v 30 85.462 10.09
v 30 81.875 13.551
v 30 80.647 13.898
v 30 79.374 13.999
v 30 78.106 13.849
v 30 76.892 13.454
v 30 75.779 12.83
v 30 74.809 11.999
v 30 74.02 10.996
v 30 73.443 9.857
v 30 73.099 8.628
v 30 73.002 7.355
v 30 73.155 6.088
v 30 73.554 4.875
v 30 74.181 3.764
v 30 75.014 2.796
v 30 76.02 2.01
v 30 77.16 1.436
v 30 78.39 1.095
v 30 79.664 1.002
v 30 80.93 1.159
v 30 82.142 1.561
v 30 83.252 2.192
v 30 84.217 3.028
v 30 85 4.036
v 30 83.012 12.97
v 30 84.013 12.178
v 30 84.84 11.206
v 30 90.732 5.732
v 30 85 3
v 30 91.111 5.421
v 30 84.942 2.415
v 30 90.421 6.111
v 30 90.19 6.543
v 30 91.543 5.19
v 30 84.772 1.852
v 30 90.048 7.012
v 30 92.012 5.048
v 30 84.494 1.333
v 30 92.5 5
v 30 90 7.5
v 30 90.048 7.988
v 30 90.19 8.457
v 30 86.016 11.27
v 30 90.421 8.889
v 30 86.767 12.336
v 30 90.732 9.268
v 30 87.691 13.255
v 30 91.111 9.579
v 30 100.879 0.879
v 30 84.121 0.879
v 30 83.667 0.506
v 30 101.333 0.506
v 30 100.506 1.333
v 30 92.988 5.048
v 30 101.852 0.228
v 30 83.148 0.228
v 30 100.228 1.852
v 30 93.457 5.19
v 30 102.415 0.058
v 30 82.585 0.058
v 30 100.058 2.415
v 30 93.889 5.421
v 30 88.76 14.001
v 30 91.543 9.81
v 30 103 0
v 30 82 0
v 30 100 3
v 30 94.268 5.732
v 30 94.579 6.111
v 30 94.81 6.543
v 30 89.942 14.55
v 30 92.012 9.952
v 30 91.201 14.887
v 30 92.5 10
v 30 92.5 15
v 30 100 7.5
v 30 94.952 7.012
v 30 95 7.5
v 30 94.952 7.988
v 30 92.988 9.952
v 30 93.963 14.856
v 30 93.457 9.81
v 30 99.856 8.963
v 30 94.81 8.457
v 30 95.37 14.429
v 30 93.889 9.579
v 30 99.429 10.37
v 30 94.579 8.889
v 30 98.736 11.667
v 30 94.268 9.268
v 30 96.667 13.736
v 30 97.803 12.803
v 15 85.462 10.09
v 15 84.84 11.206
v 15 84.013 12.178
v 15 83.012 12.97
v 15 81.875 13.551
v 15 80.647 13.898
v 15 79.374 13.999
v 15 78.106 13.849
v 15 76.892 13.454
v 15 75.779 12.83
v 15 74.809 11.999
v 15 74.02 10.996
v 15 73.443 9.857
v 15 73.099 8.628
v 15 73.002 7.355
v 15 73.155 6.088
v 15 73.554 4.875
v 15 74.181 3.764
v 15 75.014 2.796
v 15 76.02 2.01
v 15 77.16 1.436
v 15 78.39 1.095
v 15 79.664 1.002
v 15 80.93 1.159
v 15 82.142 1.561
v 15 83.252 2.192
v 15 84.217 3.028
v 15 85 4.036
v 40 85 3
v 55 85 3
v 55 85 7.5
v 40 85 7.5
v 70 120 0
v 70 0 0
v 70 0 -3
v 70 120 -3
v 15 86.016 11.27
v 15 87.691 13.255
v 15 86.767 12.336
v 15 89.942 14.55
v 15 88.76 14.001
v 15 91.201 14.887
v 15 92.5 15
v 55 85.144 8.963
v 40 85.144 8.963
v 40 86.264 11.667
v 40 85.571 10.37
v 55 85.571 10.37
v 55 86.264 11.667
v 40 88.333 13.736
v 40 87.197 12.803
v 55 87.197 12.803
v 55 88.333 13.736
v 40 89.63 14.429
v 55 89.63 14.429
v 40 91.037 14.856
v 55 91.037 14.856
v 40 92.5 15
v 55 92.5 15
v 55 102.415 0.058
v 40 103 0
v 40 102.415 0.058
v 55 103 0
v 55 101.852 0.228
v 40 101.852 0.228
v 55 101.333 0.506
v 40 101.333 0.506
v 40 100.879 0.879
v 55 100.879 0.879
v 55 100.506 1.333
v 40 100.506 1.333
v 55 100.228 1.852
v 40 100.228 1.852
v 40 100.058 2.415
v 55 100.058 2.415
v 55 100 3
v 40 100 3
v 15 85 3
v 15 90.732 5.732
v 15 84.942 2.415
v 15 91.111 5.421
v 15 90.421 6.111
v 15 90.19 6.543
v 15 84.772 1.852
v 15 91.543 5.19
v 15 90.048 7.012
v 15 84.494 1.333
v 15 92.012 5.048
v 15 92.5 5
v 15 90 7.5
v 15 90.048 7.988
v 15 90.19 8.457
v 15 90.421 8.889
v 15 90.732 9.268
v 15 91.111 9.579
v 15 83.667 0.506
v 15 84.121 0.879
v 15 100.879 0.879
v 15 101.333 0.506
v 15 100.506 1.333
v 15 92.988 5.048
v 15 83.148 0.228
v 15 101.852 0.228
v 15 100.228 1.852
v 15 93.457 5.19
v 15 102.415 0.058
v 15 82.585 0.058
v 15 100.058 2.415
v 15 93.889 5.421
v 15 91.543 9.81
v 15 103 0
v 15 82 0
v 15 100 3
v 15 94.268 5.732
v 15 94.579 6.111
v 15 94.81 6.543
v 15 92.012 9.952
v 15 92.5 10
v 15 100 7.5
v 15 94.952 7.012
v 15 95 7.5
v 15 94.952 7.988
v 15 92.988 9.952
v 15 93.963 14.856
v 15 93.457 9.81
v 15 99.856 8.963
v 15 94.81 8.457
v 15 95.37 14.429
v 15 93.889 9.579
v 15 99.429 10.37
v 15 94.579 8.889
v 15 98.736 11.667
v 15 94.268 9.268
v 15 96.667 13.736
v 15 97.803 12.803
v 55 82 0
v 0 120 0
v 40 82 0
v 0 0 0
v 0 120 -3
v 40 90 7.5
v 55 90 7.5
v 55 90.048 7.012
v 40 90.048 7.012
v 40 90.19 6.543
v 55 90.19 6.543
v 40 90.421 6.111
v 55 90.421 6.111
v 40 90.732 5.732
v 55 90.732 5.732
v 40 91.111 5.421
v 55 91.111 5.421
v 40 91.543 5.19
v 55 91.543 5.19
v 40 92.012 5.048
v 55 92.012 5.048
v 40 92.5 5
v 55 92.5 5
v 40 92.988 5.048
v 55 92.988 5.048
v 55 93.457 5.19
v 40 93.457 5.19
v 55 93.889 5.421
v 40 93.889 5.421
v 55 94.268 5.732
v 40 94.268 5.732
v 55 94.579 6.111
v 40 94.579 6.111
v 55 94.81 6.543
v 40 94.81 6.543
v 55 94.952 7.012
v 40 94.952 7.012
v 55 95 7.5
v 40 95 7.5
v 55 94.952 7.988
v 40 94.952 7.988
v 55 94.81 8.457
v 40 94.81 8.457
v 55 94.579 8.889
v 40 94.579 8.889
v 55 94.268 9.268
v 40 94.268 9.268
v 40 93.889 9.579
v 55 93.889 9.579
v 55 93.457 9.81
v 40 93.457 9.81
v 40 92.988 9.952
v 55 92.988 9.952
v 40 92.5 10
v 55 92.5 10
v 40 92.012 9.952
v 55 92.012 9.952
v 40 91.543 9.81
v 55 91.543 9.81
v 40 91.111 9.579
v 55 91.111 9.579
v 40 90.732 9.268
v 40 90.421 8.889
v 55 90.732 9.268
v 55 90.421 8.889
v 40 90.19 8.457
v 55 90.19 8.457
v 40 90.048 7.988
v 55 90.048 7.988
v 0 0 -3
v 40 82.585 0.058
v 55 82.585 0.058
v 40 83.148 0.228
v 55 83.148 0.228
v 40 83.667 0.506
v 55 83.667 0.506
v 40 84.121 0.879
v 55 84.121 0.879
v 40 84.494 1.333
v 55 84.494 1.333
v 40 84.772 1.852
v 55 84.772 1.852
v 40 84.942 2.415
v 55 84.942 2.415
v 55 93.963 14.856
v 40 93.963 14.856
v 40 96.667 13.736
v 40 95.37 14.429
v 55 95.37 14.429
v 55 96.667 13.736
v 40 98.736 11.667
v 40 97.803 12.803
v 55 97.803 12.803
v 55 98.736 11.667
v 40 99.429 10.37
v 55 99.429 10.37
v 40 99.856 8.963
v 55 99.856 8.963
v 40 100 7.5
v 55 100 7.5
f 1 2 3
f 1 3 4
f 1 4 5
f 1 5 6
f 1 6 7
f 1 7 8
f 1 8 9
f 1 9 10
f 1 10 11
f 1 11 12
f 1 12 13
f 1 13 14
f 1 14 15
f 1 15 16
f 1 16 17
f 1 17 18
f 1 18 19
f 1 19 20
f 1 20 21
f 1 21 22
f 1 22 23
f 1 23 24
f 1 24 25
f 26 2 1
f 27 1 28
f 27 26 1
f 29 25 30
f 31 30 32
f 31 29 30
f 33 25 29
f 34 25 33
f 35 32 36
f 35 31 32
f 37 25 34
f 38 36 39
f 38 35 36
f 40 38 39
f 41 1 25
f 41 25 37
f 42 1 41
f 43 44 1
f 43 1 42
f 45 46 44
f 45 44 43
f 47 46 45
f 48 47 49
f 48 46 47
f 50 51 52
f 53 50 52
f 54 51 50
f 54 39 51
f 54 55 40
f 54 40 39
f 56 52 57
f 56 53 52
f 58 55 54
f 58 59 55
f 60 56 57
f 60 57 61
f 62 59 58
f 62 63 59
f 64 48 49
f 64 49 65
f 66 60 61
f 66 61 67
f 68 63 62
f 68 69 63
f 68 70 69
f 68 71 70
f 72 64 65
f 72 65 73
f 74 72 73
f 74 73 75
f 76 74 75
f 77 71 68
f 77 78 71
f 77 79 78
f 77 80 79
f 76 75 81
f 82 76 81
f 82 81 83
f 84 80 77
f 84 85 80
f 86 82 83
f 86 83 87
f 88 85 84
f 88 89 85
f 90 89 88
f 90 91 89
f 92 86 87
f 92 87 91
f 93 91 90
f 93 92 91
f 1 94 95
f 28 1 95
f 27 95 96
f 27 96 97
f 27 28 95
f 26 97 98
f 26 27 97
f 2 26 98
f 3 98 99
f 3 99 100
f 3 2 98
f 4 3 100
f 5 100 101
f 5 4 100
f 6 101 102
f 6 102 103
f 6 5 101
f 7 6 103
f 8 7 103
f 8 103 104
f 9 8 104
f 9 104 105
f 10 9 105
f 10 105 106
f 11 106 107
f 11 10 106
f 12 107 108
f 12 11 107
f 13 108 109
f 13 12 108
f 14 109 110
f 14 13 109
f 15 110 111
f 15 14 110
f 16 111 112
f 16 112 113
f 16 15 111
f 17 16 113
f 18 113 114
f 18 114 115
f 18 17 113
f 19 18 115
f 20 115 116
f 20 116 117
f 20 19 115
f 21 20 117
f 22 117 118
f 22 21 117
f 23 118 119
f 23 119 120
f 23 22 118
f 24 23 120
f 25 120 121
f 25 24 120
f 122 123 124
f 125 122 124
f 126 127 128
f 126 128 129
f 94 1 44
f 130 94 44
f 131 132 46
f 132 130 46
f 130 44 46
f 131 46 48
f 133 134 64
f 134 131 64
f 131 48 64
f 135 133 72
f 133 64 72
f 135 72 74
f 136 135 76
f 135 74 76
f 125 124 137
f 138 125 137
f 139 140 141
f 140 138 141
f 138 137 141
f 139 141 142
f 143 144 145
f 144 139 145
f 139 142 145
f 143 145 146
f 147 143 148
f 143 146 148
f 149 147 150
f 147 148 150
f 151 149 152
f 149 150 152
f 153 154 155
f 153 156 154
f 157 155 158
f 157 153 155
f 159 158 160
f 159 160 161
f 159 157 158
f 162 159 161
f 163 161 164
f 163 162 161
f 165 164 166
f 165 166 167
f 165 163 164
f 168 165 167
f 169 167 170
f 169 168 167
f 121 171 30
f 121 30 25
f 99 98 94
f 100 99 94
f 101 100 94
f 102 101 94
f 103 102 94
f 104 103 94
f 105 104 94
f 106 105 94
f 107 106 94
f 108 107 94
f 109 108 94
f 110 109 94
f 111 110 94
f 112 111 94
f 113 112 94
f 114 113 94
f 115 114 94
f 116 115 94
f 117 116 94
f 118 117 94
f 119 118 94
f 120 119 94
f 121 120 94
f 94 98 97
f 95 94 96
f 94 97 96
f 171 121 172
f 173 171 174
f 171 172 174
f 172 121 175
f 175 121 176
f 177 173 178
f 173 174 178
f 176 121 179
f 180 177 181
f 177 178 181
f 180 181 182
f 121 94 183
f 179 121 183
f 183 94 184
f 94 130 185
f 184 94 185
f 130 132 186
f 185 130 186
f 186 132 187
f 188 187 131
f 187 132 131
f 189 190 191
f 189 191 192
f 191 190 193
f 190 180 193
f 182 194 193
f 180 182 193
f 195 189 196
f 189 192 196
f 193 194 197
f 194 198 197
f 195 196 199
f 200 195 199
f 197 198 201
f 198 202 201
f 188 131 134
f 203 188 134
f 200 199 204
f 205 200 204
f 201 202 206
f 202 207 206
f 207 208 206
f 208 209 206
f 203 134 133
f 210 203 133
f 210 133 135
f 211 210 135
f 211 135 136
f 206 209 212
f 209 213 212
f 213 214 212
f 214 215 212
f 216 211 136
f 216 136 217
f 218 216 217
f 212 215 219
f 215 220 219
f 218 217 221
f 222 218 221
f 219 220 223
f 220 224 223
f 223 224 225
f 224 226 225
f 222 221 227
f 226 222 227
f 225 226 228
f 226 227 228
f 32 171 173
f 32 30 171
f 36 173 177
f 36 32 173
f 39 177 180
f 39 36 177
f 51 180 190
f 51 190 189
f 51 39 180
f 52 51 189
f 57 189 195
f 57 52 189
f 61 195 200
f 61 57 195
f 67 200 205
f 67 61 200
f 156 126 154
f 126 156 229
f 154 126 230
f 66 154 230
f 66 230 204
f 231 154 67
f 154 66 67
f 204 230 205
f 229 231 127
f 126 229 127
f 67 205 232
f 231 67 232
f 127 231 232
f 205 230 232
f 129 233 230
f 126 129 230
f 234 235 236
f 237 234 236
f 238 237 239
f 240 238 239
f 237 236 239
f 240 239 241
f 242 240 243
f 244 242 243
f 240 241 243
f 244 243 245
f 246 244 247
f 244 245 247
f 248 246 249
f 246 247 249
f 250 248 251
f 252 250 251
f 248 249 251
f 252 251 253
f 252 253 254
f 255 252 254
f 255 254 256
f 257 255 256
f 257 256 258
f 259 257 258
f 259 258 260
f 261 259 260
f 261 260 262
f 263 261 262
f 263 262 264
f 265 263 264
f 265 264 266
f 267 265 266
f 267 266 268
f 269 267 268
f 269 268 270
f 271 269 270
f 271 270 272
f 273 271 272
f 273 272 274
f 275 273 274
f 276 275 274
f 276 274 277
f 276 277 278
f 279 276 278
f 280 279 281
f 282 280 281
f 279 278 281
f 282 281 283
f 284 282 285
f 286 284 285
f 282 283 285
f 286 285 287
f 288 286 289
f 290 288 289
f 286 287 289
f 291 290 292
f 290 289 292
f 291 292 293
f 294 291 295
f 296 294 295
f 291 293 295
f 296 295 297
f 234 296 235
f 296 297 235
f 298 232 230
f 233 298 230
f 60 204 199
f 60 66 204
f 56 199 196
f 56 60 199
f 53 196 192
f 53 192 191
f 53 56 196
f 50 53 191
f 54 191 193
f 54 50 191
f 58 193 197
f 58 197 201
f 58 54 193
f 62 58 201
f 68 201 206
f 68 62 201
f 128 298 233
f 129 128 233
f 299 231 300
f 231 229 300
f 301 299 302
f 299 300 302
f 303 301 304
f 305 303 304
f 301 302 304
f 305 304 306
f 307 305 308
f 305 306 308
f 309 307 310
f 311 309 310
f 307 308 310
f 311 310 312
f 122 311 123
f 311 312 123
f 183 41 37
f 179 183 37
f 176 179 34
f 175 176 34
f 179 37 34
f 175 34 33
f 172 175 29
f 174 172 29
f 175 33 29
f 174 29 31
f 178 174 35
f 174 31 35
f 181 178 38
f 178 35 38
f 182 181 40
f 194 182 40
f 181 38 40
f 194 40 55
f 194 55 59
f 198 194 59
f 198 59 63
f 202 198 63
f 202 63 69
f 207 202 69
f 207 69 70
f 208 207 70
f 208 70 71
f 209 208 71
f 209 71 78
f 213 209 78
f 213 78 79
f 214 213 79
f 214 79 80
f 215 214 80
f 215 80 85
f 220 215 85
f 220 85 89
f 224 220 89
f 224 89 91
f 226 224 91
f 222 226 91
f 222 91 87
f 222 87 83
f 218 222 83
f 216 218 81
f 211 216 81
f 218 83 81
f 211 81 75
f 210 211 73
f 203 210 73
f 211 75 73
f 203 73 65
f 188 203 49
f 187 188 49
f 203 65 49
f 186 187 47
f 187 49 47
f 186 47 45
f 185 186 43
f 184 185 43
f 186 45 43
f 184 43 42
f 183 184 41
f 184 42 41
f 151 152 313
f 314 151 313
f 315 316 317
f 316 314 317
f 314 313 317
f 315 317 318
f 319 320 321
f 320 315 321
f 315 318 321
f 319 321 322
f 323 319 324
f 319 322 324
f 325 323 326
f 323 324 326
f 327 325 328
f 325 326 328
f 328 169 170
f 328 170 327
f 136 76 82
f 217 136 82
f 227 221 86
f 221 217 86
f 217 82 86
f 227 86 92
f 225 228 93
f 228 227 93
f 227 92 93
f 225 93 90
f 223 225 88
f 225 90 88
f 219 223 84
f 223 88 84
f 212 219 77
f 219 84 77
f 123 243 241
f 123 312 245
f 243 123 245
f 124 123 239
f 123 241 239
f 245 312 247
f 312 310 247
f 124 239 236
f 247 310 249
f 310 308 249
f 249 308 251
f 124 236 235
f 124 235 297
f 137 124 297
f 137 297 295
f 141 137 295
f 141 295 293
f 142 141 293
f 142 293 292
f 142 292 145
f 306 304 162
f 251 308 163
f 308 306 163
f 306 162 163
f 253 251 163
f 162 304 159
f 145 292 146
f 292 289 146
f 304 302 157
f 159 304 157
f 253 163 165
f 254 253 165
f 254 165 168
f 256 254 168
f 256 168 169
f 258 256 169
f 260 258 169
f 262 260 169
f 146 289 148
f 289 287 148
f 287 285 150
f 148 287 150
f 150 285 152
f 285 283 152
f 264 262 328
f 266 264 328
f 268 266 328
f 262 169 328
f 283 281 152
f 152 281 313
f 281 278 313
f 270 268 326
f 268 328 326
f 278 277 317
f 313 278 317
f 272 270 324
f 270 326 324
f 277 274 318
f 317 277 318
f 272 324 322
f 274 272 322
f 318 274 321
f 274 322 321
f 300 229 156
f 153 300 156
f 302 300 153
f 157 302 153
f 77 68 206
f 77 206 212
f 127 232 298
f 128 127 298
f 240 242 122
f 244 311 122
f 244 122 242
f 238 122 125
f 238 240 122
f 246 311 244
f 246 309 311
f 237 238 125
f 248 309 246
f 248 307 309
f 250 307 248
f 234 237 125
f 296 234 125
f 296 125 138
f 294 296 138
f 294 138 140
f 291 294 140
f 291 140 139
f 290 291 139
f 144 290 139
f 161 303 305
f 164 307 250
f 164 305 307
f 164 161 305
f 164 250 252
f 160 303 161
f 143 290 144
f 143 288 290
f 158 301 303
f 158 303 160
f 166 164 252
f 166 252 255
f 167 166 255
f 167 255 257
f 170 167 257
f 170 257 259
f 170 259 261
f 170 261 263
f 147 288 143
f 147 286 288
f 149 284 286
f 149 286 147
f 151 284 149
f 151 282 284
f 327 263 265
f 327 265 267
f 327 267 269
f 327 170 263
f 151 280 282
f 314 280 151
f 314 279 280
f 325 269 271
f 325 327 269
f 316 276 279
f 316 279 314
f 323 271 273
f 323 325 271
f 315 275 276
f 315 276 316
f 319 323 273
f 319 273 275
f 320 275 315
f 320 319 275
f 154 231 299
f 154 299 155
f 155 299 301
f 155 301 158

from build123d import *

# Parameters (mm, degrees)
F0_W     = 15
F0_H     = 15
F1_DEPTH = 70
F2_D     = 5
F4_R     = 7.49999
F3_W     = 15
F3_H     = 15
F3_W_2   = 10
F5_DEPTH = 15
F6_R     = 3
F8_DEPTH = 15


# Not quite as in the source:
# - a fillet or chamfer is up to 0.001 mm smaller than in the source, because OpenCascade refuses the exact size


with BuildPart() as f1:
    # F0 (on Right) → F1 (new body)
    with BuildSketch(Plane.YZ):
        with Locations((92.5, 7.5)):
            Rectangle(F0_W, F0_H)
        Polygon((85, 0), (0, 0), (0, -3), (120, -3), (120, 0), (100, 0), align=None)
    extrude(amount=F1_DEPTH)

    # F2 (through all)
    with Locations(Plane(origin=(0, 0, 0), x_dir=(0, 1, 0), z_dir=(-1, 0, 0))):
        with Locations((92.5, -7.5)):
            Hole(F2_D / 2)

    # F4 (radius 7.5 in the source; OpenCascade refuses exactly that, so slightly less here)
    f4_edges = [f1.edges().sort_by_distance(p)[0] for p in [
        (35, 85, 15),
        (35, 100, 15),
    ]]
    fillet(f4_edges, radius=F4_R)

    # F3 (on face) → F5 (cut, through all)
    with BuildSketch(Plane(origin=(0, 100, 0), x_dir=(-1, 0, 0), z_dir=(0, 1, 0))):
        with Locations((-62.5, 7.5)):
            Rectangle(F3_W, F3_H)
        with Locations((-7.5, 7.5)):
            Rectangle(F3_W, F3_H)
        with Locations((-35, 7.5)):
            Rectangle(F3_W_2, F3_H)
    extrude(amount=-F5_DEPTH, mode=Mode.SUBTRACT)

    # F6
    f6_edges = [f1.edges().sort_by_distance(p)[0] for p in [
        (47.5, 85, 0),
        (22.5, 85, 0),
        (22.5, 100, 0),
        (47.5, 100, 0),
    ]]
    fillet(f6_edges, radius=F6_R)

    # F7 (on face) → F8 (join, through all)
    with BuildSketch(Plane.YZ.offset(30)):
        with BuildLine():
            ThreePointArc((85, 7.50001), (85.1162856981, 8.815593818), (85.461536824, 10.0903819596))
            ThreePointArc((85.461536824, 10.0903819596), (73.0188041666, 7.994065349), (85, 4.0358983849))
            Line((85, 4.0358983849), (85, 7.50001))
        make_face()
        with BuildLine():
            ThreePointArc((85, 4.0358983849), (85.7449979984, 5.6972243623), (86, 7.5))
            ThreePointArc((86, 7.5), (85.8639606125, 8.8228776671), (85.461536824, 10.0903819596))
            ThreePointArc((85.461536824, 10.0903819596), (85.1162856981, 8.815593818), (85, 7.50001))
            Line((85, 7.50001), (85, 4.0358983849))
        make_face()
    extrude(amount=-F8_DEPTH)


solid = f1.part
